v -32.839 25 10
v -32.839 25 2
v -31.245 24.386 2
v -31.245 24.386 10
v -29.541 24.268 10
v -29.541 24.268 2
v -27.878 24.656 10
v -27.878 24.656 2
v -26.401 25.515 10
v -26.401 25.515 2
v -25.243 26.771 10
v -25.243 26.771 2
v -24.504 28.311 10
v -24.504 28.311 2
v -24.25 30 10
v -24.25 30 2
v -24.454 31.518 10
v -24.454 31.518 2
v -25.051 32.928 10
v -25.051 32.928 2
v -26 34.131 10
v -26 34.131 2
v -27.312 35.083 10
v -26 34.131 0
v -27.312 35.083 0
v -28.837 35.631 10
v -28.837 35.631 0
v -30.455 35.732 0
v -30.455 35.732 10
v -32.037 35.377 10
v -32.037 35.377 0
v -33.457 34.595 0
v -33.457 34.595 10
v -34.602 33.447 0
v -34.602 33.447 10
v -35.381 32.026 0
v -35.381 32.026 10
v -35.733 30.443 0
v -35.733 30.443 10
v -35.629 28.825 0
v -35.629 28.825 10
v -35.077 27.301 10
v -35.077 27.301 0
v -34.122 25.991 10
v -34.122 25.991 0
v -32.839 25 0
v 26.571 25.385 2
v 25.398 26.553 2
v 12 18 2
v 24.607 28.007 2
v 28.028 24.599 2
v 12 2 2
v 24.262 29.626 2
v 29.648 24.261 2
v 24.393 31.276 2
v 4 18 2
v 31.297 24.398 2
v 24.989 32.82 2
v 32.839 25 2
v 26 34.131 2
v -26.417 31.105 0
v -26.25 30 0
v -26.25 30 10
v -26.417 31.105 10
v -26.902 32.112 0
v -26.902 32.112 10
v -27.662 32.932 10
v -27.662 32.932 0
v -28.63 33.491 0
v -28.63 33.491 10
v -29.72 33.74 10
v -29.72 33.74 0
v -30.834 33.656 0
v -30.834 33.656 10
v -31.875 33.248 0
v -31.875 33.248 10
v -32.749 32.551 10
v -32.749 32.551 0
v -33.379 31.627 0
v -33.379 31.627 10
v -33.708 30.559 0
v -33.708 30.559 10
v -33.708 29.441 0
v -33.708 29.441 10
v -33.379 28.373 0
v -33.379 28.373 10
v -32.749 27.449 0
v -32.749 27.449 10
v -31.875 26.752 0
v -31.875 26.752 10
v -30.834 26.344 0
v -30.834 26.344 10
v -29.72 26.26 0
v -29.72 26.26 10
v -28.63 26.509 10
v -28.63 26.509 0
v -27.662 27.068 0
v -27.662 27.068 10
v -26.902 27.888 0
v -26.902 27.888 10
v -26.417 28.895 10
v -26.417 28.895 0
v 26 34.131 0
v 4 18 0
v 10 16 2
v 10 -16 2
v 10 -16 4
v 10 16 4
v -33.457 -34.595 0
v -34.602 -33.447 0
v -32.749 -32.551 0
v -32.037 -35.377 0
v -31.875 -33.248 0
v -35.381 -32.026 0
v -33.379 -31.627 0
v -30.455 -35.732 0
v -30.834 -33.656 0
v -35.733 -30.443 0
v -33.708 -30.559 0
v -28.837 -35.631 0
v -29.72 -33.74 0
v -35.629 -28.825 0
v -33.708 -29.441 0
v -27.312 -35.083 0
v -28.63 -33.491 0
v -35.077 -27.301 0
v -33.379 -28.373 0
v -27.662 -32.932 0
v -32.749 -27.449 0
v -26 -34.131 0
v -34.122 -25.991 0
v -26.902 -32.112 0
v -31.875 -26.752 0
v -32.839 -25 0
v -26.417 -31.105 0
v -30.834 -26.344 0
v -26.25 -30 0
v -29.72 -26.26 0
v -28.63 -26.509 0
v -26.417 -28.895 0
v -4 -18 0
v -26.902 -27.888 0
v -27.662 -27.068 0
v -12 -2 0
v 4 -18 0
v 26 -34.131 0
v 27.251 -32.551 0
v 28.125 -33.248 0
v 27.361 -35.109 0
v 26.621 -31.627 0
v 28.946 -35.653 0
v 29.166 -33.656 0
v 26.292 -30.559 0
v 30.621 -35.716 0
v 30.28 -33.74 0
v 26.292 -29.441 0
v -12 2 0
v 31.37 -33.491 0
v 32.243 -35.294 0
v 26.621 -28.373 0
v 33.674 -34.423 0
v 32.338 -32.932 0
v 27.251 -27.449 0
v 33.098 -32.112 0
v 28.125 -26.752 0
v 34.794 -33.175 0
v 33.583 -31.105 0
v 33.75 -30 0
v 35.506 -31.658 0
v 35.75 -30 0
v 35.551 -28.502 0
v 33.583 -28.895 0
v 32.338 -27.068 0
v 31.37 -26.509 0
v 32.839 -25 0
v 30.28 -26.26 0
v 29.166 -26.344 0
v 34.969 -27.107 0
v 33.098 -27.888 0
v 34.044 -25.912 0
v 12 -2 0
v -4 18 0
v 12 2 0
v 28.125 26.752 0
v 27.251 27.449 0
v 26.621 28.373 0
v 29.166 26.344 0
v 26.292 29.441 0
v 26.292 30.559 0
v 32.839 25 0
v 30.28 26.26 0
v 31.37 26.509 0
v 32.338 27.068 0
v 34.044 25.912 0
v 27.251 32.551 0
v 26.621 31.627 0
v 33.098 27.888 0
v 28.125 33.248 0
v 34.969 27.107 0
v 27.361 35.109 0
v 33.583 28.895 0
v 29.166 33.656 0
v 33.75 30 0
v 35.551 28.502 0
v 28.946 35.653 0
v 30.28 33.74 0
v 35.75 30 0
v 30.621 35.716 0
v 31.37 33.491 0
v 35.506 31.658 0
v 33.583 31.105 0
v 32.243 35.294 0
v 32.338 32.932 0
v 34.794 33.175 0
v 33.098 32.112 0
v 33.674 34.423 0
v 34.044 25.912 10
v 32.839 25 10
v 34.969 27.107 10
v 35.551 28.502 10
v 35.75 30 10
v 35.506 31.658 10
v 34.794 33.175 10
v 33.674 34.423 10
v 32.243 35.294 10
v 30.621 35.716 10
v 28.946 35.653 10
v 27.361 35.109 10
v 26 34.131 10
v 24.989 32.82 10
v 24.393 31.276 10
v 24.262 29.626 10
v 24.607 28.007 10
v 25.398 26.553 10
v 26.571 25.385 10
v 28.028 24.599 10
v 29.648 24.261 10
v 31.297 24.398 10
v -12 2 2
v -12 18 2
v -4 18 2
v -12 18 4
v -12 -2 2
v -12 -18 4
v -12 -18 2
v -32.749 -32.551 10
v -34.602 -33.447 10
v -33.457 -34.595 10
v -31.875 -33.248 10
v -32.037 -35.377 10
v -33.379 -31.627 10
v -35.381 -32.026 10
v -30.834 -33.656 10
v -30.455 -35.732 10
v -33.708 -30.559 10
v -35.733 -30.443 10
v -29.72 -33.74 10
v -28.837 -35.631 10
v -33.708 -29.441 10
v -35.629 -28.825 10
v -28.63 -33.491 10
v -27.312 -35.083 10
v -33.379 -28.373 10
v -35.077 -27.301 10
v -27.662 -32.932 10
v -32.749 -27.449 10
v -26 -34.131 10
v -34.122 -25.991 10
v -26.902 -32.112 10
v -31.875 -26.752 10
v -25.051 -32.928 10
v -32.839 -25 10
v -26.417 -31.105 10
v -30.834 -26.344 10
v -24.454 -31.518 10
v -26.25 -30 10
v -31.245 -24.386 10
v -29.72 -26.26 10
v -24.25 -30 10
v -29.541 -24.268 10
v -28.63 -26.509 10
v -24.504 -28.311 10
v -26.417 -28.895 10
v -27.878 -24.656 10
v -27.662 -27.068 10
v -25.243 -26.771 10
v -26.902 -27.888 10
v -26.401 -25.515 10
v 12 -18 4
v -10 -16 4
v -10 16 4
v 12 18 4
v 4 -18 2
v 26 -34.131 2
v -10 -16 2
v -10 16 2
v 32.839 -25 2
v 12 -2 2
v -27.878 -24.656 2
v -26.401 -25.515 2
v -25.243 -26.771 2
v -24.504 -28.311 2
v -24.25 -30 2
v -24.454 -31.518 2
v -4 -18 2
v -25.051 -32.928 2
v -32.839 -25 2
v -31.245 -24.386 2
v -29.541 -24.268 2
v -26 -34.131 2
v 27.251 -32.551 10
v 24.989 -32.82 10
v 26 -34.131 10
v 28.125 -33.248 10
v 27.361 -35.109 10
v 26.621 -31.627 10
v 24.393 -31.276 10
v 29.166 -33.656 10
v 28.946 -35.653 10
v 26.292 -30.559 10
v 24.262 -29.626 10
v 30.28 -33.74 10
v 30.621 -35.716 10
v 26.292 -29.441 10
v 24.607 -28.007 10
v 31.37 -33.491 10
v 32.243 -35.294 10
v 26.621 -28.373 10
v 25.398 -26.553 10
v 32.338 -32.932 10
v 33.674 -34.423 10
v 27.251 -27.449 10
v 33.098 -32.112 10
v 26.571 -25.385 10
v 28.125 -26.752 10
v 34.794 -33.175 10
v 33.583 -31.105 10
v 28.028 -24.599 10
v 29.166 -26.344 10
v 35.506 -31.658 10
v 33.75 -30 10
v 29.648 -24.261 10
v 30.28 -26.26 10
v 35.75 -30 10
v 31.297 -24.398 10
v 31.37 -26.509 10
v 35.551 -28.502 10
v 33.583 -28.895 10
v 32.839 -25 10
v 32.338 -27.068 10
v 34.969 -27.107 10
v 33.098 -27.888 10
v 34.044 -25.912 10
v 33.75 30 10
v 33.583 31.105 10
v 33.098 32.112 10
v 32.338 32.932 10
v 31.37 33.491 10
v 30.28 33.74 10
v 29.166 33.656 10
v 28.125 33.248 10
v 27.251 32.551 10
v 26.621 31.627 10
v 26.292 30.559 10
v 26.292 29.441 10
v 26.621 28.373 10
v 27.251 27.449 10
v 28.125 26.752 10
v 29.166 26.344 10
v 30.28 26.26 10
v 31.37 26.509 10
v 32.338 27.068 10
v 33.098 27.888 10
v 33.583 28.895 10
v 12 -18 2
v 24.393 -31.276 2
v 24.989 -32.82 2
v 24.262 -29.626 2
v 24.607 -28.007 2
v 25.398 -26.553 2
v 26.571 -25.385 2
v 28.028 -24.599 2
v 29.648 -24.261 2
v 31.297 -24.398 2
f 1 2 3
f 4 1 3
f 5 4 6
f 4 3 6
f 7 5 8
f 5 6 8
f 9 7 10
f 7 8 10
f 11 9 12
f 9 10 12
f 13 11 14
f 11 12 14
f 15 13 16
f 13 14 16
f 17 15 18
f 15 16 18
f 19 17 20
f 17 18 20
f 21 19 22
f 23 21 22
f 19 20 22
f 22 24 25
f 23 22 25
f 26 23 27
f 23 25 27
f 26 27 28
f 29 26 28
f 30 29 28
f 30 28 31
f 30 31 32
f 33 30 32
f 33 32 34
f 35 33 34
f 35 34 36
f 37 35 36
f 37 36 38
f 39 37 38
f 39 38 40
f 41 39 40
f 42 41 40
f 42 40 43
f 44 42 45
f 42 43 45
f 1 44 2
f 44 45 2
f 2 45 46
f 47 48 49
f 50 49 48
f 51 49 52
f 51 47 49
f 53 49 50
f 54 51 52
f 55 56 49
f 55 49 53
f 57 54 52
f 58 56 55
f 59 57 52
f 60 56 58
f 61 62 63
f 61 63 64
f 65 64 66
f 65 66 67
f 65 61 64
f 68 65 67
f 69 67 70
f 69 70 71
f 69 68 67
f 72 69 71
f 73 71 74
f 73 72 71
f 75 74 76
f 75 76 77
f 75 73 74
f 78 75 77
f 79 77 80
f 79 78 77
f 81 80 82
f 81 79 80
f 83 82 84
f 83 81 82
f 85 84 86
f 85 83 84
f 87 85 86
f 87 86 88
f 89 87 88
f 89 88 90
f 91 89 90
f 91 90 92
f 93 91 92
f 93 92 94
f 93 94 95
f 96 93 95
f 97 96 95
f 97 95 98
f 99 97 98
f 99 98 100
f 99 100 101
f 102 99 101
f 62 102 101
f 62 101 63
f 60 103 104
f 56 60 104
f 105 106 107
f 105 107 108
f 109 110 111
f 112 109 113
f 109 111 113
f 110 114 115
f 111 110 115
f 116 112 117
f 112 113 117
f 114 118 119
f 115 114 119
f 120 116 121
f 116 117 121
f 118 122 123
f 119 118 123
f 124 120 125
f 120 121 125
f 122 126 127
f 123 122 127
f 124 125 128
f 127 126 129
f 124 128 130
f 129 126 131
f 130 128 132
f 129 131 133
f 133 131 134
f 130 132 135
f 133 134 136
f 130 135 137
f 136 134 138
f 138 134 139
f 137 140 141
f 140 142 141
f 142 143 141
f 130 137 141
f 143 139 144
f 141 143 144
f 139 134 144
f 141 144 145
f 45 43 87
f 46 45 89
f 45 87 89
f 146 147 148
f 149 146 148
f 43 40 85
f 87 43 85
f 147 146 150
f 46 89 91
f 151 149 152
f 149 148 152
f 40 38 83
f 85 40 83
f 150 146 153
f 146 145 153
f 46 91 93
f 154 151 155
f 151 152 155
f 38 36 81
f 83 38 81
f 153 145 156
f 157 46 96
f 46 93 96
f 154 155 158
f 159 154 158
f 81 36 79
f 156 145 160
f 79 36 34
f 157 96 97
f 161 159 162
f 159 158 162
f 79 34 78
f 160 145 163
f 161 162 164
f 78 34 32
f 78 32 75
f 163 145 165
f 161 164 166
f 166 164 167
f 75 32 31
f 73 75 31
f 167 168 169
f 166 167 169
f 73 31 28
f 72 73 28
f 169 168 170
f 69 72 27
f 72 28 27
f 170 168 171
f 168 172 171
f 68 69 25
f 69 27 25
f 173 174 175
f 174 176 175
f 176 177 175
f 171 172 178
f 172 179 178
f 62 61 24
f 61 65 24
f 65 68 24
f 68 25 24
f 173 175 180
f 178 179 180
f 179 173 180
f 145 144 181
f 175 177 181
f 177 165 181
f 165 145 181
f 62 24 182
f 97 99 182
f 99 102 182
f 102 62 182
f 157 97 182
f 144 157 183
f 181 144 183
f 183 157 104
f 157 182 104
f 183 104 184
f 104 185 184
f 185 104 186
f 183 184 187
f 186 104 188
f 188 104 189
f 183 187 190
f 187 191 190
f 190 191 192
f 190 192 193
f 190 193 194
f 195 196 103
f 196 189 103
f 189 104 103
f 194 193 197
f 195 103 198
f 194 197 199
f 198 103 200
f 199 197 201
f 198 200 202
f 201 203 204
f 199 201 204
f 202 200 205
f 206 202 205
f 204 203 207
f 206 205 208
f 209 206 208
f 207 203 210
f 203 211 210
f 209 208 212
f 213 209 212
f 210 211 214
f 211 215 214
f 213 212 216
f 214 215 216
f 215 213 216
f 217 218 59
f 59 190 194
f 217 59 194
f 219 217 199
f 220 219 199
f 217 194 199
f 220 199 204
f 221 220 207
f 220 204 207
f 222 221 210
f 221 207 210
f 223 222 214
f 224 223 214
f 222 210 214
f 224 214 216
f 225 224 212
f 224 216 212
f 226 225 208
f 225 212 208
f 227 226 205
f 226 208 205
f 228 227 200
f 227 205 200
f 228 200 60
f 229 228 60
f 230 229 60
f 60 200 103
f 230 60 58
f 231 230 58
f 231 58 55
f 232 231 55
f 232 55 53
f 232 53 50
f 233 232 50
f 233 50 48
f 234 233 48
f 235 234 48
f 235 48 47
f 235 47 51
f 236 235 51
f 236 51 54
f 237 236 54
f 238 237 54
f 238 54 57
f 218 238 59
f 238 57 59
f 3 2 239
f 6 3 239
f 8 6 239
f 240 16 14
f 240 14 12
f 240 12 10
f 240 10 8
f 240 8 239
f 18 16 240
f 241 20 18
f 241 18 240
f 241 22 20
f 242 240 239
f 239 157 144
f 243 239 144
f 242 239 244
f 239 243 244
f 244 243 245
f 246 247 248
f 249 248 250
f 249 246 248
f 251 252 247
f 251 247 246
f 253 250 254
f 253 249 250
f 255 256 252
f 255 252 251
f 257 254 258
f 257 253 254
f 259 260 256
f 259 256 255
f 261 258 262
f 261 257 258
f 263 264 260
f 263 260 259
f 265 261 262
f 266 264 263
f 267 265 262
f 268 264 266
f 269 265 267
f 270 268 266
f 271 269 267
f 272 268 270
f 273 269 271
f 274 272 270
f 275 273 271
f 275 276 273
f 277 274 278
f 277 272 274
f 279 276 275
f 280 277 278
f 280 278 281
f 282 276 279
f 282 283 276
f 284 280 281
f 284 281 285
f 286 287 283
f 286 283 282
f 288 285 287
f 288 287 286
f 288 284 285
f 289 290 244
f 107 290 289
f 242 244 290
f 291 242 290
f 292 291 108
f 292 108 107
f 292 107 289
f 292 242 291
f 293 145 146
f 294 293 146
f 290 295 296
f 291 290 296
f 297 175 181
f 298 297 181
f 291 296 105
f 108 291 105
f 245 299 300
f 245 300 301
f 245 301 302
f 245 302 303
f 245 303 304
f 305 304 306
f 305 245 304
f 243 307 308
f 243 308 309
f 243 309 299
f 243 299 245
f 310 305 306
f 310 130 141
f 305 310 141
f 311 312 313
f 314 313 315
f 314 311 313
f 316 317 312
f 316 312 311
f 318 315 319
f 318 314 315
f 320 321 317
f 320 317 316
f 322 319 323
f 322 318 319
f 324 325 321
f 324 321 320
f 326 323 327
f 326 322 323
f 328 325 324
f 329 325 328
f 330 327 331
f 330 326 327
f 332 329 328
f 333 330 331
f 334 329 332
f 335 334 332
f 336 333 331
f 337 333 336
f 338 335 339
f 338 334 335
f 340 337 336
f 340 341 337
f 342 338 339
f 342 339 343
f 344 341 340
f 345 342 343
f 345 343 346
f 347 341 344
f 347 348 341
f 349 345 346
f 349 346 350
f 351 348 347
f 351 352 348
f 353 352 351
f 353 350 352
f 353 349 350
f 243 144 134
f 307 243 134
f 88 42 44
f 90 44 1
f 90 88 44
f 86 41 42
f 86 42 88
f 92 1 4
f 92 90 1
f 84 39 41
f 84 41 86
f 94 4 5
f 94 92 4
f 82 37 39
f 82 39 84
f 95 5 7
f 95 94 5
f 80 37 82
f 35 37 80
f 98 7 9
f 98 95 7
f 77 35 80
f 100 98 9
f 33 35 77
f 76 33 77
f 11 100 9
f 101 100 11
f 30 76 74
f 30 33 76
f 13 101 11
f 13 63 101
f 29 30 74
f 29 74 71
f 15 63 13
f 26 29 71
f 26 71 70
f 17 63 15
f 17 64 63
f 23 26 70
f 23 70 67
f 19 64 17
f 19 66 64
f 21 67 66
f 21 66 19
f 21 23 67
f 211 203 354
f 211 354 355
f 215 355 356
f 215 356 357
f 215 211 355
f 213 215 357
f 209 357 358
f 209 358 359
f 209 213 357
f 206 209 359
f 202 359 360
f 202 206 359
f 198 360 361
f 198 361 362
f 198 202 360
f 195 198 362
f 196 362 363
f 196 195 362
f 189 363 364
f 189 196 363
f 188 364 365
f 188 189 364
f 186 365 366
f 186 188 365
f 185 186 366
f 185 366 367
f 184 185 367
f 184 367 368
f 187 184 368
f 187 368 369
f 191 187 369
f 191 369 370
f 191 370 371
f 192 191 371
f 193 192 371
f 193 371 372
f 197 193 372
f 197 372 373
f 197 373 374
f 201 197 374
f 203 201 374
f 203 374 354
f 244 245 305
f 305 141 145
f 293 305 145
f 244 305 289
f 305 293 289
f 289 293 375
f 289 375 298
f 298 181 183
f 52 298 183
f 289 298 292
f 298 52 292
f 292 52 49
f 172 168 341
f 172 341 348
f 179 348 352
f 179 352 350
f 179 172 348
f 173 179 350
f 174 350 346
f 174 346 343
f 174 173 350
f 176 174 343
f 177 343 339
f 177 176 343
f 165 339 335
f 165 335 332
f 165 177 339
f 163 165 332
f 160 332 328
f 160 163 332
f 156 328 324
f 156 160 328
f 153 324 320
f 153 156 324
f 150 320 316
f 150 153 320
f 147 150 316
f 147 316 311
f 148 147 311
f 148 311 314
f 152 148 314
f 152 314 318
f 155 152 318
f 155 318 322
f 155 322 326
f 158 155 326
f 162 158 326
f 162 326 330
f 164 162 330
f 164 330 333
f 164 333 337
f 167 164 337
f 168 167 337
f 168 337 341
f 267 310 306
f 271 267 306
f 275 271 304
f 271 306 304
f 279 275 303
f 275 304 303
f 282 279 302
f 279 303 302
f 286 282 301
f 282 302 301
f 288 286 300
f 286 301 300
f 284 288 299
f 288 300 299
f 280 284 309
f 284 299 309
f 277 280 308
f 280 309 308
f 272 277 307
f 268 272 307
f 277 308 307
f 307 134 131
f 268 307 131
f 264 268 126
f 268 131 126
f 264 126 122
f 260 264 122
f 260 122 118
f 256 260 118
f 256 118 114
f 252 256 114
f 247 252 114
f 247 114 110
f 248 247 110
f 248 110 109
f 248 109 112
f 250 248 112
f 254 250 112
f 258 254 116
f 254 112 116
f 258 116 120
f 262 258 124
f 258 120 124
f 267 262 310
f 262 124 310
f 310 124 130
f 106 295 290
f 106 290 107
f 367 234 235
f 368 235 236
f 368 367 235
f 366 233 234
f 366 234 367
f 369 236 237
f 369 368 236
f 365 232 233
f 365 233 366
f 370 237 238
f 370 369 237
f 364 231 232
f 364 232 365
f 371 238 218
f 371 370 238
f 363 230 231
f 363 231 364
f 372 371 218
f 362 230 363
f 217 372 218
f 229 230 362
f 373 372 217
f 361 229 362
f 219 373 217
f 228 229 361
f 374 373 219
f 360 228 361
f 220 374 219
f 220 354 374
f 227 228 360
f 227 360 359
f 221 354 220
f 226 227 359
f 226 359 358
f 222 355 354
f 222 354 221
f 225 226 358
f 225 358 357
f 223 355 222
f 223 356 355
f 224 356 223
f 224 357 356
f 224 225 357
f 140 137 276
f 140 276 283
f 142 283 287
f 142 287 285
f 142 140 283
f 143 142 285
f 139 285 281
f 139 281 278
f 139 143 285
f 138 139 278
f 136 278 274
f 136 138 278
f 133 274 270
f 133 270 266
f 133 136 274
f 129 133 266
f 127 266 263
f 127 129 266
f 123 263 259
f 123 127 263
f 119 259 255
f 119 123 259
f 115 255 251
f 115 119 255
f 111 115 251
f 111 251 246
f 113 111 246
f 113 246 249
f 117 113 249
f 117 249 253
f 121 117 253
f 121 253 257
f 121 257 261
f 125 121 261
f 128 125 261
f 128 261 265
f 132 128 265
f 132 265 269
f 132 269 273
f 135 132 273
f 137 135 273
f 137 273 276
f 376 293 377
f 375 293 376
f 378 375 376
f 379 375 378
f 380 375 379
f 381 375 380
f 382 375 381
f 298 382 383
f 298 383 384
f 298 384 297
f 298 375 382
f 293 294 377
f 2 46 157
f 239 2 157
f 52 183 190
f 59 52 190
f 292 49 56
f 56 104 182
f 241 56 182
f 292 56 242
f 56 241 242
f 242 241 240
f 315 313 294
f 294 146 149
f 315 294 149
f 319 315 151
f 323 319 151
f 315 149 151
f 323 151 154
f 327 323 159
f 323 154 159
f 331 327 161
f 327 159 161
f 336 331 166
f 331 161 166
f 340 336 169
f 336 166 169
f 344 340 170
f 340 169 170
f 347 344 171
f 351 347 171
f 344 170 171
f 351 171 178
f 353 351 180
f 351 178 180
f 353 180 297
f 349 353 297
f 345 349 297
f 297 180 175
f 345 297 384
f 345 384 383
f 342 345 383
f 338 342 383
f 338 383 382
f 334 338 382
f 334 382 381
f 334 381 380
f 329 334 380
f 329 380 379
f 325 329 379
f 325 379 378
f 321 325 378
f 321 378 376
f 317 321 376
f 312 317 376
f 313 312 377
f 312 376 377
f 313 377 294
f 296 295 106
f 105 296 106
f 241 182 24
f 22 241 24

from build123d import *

# Parameters (mm, degrees)
F0_W     = 20
F0_H     = 32
F0_R     = 3.75
F1_DEPTH = 2
F2_DEPTH = 10
F3_DEPTH = 4


with BuildPart() as f1:
    # F0 (on Top) → F1 (new body)
    with BuildSketch(Plane.XY):
        Polygon((4, 18), (-4, 18), (-12, 18), (-12, 2), (-12, -2), (-12, -18), (-4, -18), (4, -18), (12, -18), (12, -2), (12, 2), (12, 18), align=None)
        Rectangle(F0_W, F0_H, mode=Mode.SUBTRACT)
        Rectangle(F0_W, F0_H)
        with BuildLine():
            Line((32.8394541729, -25), (12, -2))
            Line((12, -2), (12, -18))
            Line((12, -18), (4, -18))
            Line((4, -18), (26, -34.1306779105))
            ThreePointArc((26, -34.1306779105), (25.397931288, -26.552760007), (32.8394541729, -25))
        make_face()
        with BuildLine():
            Line((-12, -18), (-12, -2))
            Line((-12, -2), (-32.8394541729, -25))
            ThreePointArc((-32.8394541729, -25), (-27.1072816845, -25.0306257188), (-24.25, -30))
            ThreePointArc((-24.25, -30), (-24.7055453539, -32.2430448056), (-26, -34.1306779105))
            Line((-26, -34.1306779105), (-4, -18))
            Line((-4, -18), (-12, -18))
        make_face()
        with BuildLine():
            Line((26, 34.1306779105), (4, 18))
            Line((4, 18), (12, 18))
            Line((12, 18), (12, 2))
            Line((12, 2), (32.8394541729, 25))
            ThreePointArc((32.8394541729, 25), (25.397931288, 26.552760007), (26, 34.1306779105))
        make_face()
        with BuildLine():
            ThreePointArc((-26, 34.1306779105), (-24.7055453539, 32.2430448056), (-24.25, 30))
            ThreePointArc((-24.25, 30), (-27.1072816845, 25.0306257188), (-32.8394541729, 25))
            Line((-32.8394541729, 25), (-12, 2))
            Line((-12, 2), (-12, 18))
            Line((-12, 18), (-4, 18))
            Line((-4, 18), (-26, 34.1306779105))
        make_face()
        with BuildLine():
            ThreePointArc((35.75, -30), (34.9693742812, -27.1072816845), (32.8394541729, -25))
            ThreePointArc((32.8394541729, -25), (25.397931288, -26.552760007), (26, -34.1306779105))
            ThreePointArc((26, -34.1306779105), (32.2430448056, -35.2944546461), (35.75, -30))
        make_face()
        with Locations((30, -30)):
            Circle(F0_R, mode=Mode.SUBTRACT)
        with BuildLine():
            ThreePointArc((35.75, 30), (32.2430448056, 35.2944546461), (26, 34.1306779105))
            ThreePointArc((26, 34.1306779105), (25.397931288, 26.552760007), (32.8394541729, 25))
            ThreePointArc((32.8394541729, 25), (34.9693742812, 27.1072816845), (35.75, 30))
        make_face()
        with Locations((30, 30)):
            Circle(F0_R, mode=Mode.SUBTRACT)
        with BuildLine():
            ThreePointArc((-32.8394541729, 25), (-27.1072816845, 25.0306257188), (-24.25, 30))
            ThreePointArc((-24.25, 30), (-24.7055453539, 32.2430448056), (-26, 34.1306779105))
            ThreePointArc((-26, 34.1306779105), (-34.602068712, 33.447239993), (-32.8394541729, 25))
        make_face()
        with Locations((-30, 30)):
            Circle(F0_R, mode=Mode.SUBTRACT)
        with BuildLine():
            ThreePointArc((-24.25, -30), (-27.1072816845, -25.0306257188), (-32.8394541729, -25))
            ThreePointArc((-32.8394541729, -25), (-34.602068712, -33.447239993), (-26, -34.1306779105))
            ThreePointArc((-26, -34.1306779105), (-24.7055453539, -32.2430448056), (-24.25, -30))
        make_face()
        with Locations((-30, -30)):
            Circle(F0_R, mode=Mode.SUBTRACT)
    extrude(amount=F1_DEPTH)

    # F0 (on Top) → F2 (join)
    with BuildSketch(Plane.XY):
        with BuildLine():
            ThreePointArc((-32.8394541729, 25), (-27.1072816845, 25.0306257188), (-24.25, 30))
            ThreePointArc((-24.25, 30), (-24.7055453539, 32.2430448056), (-26, 34.1306779105))
            ThreePointArc((-26, 34.1306779105), (-34.602068712, 33.447239993), (-32.8394541729, 25))
        make_face()
        with Locations((-30, 30)):
            Circle(F0_R, mode=Mode.SUBTRACT)
        with BuildLine():
            ThreePointArc((35.75, -30), (34.9693742812, -27.1072816845), (32.8394541729, -25))
            ThreePointArc((32.8394541729, -25), (25.397931288, -26.552760007), (26, -34.1306779105))
            ThreePointArc((26, -34.1306779105), (32.2430448056, -35.2944546461), (35.75, -30))
        make_face()
        with Locations((30, -30)):
            Circle(F0_R, mode=Mode.SUBTRACT)
        with BuildLine():
            ThreePointArc((-24.25, -30), (-27.1072816845, -25.0306257188), (-32.8394541729, -25))
            ThreePointArc((-32.8394541729, -25), (-34.602068712, -33.447239993), (-26, -34.1306779105))
            ThreePointArc((-26, -34.1306779105), (-24.7055453539, -32.2430448056), (-24.25, -30))
        make_face()
        with Locations((-30, -30)):
            Circle(F0_R, mode=Mode.SUBTRACT)
        with BuildLine():
            ThreePointArc((35.75, 30), (32.2430448056, 35.2944546461), (26, 34.1306779105))
            ThreePointArc((26, 34.1306779105), (25.397931288, 26.552760007), (32.8394541729, 25))
            ThreePointArc((32.8394541729, 25), (34.9693742812, 27.1072816845), (35.75, 30))
        make_face()
        with Locations((30, 30)):
            Circle(F0_R, mode=Mode.SUBTRACT)
    extrude(amount=F2_DEPTH)

    # F0 (on Top) → F3 (join)
    with BuildSketch(Plane.XY):
        Polygon((4, 18), (-4, 18), (-12, 18), (-12, 2), (-12, -2), (-12, -18), (-4, -18), (4, -18), (12, -18), (12, -2), (12, 2), (12, 18), align=None)
        Rectangle(F0_W, F0_H, mode=Mode.SUBTRACT)
    extrude(amount=F3_DEPTH)


solid = f1.part
